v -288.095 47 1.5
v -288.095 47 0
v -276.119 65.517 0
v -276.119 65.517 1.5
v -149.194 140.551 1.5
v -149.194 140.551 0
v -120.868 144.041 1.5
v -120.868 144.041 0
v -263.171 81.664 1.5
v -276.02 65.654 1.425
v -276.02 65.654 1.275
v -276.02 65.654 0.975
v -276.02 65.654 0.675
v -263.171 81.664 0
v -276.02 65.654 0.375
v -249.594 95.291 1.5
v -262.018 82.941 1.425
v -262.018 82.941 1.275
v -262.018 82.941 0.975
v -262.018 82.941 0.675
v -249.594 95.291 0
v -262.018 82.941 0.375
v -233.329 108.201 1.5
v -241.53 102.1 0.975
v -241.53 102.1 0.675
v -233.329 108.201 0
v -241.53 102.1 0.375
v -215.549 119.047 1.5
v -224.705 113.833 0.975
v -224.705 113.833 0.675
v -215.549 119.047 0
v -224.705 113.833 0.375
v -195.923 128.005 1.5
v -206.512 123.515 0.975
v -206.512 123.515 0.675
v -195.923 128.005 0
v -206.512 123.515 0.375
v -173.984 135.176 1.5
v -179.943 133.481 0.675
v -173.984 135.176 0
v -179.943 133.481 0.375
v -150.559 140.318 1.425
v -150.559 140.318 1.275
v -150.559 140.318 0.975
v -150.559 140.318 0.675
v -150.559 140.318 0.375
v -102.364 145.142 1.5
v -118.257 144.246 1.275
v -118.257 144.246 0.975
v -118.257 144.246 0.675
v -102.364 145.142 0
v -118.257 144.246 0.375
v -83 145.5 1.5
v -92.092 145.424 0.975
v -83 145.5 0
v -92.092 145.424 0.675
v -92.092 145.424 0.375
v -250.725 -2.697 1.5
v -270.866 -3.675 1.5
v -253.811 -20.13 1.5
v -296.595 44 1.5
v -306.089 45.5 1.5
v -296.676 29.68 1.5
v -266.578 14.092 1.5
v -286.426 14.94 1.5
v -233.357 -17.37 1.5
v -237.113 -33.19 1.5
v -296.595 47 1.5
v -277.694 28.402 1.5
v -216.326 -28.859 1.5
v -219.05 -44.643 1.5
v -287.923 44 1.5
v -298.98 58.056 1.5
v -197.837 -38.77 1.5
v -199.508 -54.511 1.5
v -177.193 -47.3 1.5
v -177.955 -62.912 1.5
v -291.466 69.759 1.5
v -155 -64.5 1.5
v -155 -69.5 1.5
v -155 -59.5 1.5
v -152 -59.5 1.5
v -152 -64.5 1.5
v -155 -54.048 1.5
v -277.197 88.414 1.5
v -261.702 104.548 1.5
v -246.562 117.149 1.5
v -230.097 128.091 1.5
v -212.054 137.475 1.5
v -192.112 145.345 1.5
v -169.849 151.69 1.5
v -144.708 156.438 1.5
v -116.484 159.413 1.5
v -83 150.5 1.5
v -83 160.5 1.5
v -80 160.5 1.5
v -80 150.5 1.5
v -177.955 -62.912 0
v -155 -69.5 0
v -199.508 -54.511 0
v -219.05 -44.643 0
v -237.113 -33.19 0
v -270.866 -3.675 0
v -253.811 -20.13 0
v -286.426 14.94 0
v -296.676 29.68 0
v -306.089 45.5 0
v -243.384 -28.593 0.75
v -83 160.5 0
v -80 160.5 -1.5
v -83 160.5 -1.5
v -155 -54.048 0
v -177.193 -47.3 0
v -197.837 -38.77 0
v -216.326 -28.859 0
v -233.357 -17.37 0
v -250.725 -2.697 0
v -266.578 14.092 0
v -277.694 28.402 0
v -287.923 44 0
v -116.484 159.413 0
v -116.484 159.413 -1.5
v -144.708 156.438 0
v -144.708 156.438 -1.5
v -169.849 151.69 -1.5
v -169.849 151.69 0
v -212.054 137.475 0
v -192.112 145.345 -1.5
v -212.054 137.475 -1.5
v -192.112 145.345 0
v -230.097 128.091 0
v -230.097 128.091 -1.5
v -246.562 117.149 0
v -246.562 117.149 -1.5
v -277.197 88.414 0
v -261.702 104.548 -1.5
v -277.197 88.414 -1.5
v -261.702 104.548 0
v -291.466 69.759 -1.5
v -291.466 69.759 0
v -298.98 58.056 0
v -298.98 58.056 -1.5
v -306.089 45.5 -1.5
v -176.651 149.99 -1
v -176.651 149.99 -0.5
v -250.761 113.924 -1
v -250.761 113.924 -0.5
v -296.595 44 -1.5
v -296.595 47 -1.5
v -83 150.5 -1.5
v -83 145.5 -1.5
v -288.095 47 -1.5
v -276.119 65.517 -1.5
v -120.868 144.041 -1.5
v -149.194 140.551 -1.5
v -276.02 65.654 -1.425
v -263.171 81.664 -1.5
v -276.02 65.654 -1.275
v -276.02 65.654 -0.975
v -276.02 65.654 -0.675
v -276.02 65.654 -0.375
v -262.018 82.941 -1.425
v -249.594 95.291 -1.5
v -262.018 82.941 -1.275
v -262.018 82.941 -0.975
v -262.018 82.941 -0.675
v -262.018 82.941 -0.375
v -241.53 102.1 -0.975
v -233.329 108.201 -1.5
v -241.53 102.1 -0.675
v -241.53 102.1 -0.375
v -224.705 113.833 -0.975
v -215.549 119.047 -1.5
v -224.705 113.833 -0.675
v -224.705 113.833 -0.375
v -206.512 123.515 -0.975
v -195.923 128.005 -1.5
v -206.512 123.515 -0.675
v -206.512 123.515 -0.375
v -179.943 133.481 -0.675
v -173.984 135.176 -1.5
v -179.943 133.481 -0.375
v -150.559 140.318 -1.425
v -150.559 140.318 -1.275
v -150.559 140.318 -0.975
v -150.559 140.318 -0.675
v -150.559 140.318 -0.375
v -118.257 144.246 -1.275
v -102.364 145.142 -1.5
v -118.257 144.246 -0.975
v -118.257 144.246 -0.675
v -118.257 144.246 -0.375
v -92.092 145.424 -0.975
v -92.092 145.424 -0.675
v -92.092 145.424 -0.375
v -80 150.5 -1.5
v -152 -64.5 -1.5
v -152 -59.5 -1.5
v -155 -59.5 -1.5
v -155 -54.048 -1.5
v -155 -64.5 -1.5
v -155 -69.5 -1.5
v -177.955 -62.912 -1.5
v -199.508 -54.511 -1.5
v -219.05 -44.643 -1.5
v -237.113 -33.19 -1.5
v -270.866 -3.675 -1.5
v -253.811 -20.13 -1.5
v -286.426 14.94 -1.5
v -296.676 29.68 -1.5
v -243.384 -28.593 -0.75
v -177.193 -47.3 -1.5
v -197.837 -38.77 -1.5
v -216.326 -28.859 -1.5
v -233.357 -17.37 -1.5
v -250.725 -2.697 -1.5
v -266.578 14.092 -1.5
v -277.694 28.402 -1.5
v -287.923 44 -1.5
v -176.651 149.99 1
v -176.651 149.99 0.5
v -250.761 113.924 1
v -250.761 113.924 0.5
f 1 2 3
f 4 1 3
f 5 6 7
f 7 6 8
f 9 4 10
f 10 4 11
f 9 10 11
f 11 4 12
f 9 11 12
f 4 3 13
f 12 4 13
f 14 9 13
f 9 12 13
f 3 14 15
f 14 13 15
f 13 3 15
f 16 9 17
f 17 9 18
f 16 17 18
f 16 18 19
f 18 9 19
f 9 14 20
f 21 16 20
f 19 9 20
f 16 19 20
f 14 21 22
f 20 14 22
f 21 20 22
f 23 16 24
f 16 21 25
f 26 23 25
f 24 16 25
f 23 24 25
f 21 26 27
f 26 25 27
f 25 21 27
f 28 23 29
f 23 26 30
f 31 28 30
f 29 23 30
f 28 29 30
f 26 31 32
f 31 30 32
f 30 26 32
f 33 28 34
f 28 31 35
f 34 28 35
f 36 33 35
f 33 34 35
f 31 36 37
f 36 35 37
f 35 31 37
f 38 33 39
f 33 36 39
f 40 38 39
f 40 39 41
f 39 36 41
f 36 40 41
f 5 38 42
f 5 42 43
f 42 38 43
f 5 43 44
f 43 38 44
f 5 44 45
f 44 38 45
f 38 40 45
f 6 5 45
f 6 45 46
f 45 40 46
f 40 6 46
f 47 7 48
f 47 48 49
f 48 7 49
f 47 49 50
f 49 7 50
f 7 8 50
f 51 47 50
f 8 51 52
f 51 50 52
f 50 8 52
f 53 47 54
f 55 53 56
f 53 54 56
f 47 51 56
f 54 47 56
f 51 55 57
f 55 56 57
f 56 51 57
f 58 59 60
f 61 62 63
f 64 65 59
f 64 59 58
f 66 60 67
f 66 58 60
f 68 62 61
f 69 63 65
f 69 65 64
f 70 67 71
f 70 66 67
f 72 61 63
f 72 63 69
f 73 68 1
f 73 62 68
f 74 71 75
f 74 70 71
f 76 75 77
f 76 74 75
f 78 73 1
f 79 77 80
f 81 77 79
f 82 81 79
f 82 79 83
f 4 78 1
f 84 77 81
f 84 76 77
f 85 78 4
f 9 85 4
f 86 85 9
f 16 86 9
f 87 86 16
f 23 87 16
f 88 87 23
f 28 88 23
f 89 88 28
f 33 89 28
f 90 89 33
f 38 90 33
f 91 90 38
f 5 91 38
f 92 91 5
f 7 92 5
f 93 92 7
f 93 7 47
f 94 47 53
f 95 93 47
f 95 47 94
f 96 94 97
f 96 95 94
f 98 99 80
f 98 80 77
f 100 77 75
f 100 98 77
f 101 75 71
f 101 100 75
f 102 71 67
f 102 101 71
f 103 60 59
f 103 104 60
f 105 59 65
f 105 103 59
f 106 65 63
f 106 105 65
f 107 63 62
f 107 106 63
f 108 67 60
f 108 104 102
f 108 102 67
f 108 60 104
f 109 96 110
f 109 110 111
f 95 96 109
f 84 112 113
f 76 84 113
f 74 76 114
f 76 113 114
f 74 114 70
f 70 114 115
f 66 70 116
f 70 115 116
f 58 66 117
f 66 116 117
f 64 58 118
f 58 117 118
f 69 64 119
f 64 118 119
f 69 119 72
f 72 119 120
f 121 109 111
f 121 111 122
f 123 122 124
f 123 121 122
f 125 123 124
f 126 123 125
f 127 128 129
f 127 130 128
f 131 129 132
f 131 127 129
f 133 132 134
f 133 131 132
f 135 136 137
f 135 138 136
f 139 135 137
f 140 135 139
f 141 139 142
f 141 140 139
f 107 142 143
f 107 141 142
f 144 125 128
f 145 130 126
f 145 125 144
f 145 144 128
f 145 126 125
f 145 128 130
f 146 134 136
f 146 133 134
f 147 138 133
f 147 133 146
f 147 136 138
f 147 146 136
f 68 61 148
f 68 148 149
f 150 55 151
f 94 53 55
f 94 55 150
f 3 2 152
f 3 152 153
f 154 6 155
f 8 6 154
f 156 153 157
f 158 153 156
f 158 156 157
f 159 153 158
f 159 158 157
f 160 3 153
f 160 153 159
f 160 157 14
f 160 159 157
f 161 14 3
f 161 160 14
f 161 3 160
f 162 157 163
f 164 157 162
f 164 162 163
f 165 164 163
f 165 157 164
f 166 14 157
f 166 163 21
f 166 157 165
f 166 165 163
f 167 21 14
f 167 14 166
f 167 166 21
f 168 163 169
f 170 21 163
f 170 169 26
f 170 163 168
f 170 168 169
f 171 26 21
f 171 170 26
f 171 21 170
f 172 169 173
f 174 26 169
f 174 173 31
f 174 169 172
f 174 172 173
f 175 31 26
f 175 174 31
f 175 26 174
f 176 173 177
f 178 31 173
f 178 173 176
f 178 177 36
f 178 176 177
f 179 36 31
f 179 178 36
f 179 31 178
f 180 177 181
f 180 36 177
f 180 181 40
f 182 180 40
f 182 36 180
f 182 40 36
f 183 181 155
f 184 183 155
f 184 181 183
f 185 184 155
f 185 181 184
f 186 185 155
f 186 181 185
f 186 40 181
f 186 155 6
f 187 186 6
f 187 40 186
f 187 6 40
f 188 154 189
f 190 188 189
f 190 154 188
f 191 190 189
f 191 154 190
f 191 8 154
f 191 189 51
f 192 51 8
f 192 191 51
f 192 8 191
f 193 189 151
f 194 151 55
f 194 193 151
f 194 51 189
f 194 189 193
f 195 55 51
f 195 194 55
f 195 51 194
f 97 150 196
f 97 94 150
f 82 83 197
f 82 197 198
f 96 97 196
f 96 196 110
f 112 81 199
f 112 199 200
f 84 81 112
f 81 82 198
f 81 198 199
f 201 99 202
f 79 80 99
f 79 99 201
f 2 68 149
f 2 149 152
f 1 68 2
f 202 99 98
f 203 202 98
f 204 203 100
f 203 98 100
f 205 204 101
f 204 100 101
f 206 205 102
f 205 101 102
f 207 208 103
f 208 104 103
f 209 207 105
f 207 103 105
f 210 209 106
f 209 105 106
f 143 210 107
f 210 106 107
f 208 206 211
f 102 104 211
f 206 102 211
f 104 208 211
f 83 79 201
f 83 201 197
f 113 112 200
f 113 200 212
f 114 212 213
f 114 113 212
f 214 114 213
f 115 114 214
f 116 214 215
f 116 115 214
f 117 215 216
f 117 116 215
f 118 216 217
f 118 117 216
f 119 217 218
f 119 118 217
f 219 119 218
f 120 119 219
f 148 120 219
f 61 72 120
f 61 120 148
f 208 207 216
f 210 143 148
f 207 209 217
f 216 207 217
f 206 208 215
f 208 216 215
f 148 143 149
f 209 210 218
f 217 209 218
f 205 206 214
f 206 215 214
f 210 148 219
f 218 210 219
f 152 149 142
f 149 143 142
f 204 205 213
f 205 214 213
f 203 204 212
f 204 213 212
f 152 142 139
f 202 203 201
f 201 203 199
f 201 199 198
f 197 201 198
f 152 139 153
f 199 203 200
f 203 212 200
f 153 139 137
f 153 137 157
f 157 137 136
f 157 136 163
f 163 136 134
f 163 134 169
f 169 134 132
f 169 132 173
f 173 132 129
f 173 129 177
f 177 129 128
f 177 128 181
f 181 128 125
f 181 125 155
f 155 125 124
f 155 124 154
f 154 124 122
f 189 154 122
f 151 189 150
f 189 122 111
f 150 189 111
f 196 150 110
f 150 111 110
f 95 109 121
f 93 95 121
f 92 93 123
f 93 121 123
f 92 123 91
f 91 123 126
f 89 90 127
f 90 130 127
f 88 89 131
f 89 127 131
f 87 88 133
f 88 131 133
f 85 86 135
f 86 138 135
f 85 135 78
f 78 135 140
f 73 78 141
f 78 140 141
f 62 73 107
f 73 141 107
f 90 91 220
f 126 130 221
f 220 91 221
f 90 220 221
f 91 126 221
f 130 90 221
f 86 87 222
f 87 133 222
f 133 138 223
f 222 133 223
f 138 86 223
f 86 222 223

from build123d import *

# Parameters (mm, degrees)
BOSS_EXTRUDE1_DEPTH = 1.5


with BuildPart() as part:
    # Sketch1 → Boss-Extrude1 (new, symmetric)
    with BuildSketch(Plane.XY):
        with BuildLine():
            Line((-83, 150.5), (-80, 150.5))
            Line((-80, 150.5), (-80, 160.5))
            Line((-80, 160.5), (-83, 160.5))
            add(Edge.make_bspline(
                [(-83, 160.5), (-186.674882328, 160.5), (-259.899625943, 132.369993049), (-306.089272366, 45.5)],
                knots=[0, 0, 0, 0, 1, 1, 1, 1], degree=3))
            add(Edge.make_bspline(
                [(-155, -69.5), (-256.223953913, -45.186386925), (-306.089272366, 45.5)],
                knots=[0, 0, 0, 1, 1, 1], degree=2))
            Line((-155, -69.5), (-154.999999917, -64.5))
            Line((-154.999999917, -64.5), (-152, -64.5))
            Line((-152, -64.5), (-152, -59.5))
            Line((-152, -59.5), (-154.999999917, -59.5))
            Line((-154.999999917, -59.5), (-154.999999917, -54.048230847))
            add(Edge.make_bspline(
                [(-154.999999917, -54.048230847), (-155.731391017, -53.861952556), (-158.35300609, -53.18251016), (-164.660079812, -51.441937103), (-173.748401065, -48.593950888), (-184.269254843, -44.741272938), (-197.799811005, -39.023974286), (-213.789585617, -30.792816145), (-231.54938628, -19.175615564), (-247.929147797, -5.797107699), (-260.461993531, 6.849243634), (-269.830689916, 17.887635578), (-276.528905481, 26.631356248), (-281.840565627, 34.314662243), (-285.585788565, 40.16703977), (-287.259111537, 42.898020189), (-287.922750115, 44.000000102)],
                knots=[0.497752743, 0.497752743, 0.497752743, 0.497752743, 0.497805621, 0.497942734, 0.498216959, 0.498491185, 0.49876541, 0.499313861, 0.499862311, 0.500410762, 0.500959213, 0.501233438, 0.501507663, 0.501781889, 0.501919001, 0.502011047, 0.502011047, 0.502011047, 0.502011047], degree=3))
            Line((-287.922750115, 44.000000102), (-296.595237141, 44))
            Line((-296.595237141, 44), (-296.595237141, 47))
            Line((-296.595237141, 47), (-288.095237155, 46.999999977))
            add(Edge.make_bspline(
                [(-288.095237155, 46.999999977), (-287.67425608, 47.723773029), (-286.556391538, 49.623615877), (-284.033138295, 53.780945513), (-280.456261147, 59.345240484), (-276.041179686, 65.705065743), (-269.986302057, 73.779240653), (-262.103210513, 83.128273836), (-252.129600389, 93.224723366), (-241.623487548, 102.265543316), (-226.8699821, 112.996693644), (-206.95054411, 124.077334491), (-184.837162494, 132.347816663), (-165.731643324, 137.402287642), (-150.68126183, 140.438776977), (-134.89929995, 142.748064465), (-121.133672011, 144.089727596), (-109.75100783, 144.828269011), (-101.030097883, 145.218689511), (-93.605076071, 145.411132847), (-87.580198375, 145.487405992), (-84.523017423, 145.5), (-83, 145.5)],
                knots=[0.005881872, 0.005881872, 0.005881872, 0.005881872, 0.01516131, 0.03032262, 0.060645241, 0.090967861, 0.121290481, 0.181935722, 0.242580962, 0.303226203, 0.363871444, 0.485161925, 0.606452406, 0.667097647, 0.727742887, 0.788388128, 0.849033368, 0.879355989, 0.909678609, 0.940001229, 0.955162539, 0.97032385, 0.97032385, 0.97032385, 0.97032385], degree=3))
            Line((-83, 145.5), (-83, 150.5))
        make_face()
    extrude(amount=BOSS_EXTRUDE1_DEPTH, both=True)


solid = part.part
